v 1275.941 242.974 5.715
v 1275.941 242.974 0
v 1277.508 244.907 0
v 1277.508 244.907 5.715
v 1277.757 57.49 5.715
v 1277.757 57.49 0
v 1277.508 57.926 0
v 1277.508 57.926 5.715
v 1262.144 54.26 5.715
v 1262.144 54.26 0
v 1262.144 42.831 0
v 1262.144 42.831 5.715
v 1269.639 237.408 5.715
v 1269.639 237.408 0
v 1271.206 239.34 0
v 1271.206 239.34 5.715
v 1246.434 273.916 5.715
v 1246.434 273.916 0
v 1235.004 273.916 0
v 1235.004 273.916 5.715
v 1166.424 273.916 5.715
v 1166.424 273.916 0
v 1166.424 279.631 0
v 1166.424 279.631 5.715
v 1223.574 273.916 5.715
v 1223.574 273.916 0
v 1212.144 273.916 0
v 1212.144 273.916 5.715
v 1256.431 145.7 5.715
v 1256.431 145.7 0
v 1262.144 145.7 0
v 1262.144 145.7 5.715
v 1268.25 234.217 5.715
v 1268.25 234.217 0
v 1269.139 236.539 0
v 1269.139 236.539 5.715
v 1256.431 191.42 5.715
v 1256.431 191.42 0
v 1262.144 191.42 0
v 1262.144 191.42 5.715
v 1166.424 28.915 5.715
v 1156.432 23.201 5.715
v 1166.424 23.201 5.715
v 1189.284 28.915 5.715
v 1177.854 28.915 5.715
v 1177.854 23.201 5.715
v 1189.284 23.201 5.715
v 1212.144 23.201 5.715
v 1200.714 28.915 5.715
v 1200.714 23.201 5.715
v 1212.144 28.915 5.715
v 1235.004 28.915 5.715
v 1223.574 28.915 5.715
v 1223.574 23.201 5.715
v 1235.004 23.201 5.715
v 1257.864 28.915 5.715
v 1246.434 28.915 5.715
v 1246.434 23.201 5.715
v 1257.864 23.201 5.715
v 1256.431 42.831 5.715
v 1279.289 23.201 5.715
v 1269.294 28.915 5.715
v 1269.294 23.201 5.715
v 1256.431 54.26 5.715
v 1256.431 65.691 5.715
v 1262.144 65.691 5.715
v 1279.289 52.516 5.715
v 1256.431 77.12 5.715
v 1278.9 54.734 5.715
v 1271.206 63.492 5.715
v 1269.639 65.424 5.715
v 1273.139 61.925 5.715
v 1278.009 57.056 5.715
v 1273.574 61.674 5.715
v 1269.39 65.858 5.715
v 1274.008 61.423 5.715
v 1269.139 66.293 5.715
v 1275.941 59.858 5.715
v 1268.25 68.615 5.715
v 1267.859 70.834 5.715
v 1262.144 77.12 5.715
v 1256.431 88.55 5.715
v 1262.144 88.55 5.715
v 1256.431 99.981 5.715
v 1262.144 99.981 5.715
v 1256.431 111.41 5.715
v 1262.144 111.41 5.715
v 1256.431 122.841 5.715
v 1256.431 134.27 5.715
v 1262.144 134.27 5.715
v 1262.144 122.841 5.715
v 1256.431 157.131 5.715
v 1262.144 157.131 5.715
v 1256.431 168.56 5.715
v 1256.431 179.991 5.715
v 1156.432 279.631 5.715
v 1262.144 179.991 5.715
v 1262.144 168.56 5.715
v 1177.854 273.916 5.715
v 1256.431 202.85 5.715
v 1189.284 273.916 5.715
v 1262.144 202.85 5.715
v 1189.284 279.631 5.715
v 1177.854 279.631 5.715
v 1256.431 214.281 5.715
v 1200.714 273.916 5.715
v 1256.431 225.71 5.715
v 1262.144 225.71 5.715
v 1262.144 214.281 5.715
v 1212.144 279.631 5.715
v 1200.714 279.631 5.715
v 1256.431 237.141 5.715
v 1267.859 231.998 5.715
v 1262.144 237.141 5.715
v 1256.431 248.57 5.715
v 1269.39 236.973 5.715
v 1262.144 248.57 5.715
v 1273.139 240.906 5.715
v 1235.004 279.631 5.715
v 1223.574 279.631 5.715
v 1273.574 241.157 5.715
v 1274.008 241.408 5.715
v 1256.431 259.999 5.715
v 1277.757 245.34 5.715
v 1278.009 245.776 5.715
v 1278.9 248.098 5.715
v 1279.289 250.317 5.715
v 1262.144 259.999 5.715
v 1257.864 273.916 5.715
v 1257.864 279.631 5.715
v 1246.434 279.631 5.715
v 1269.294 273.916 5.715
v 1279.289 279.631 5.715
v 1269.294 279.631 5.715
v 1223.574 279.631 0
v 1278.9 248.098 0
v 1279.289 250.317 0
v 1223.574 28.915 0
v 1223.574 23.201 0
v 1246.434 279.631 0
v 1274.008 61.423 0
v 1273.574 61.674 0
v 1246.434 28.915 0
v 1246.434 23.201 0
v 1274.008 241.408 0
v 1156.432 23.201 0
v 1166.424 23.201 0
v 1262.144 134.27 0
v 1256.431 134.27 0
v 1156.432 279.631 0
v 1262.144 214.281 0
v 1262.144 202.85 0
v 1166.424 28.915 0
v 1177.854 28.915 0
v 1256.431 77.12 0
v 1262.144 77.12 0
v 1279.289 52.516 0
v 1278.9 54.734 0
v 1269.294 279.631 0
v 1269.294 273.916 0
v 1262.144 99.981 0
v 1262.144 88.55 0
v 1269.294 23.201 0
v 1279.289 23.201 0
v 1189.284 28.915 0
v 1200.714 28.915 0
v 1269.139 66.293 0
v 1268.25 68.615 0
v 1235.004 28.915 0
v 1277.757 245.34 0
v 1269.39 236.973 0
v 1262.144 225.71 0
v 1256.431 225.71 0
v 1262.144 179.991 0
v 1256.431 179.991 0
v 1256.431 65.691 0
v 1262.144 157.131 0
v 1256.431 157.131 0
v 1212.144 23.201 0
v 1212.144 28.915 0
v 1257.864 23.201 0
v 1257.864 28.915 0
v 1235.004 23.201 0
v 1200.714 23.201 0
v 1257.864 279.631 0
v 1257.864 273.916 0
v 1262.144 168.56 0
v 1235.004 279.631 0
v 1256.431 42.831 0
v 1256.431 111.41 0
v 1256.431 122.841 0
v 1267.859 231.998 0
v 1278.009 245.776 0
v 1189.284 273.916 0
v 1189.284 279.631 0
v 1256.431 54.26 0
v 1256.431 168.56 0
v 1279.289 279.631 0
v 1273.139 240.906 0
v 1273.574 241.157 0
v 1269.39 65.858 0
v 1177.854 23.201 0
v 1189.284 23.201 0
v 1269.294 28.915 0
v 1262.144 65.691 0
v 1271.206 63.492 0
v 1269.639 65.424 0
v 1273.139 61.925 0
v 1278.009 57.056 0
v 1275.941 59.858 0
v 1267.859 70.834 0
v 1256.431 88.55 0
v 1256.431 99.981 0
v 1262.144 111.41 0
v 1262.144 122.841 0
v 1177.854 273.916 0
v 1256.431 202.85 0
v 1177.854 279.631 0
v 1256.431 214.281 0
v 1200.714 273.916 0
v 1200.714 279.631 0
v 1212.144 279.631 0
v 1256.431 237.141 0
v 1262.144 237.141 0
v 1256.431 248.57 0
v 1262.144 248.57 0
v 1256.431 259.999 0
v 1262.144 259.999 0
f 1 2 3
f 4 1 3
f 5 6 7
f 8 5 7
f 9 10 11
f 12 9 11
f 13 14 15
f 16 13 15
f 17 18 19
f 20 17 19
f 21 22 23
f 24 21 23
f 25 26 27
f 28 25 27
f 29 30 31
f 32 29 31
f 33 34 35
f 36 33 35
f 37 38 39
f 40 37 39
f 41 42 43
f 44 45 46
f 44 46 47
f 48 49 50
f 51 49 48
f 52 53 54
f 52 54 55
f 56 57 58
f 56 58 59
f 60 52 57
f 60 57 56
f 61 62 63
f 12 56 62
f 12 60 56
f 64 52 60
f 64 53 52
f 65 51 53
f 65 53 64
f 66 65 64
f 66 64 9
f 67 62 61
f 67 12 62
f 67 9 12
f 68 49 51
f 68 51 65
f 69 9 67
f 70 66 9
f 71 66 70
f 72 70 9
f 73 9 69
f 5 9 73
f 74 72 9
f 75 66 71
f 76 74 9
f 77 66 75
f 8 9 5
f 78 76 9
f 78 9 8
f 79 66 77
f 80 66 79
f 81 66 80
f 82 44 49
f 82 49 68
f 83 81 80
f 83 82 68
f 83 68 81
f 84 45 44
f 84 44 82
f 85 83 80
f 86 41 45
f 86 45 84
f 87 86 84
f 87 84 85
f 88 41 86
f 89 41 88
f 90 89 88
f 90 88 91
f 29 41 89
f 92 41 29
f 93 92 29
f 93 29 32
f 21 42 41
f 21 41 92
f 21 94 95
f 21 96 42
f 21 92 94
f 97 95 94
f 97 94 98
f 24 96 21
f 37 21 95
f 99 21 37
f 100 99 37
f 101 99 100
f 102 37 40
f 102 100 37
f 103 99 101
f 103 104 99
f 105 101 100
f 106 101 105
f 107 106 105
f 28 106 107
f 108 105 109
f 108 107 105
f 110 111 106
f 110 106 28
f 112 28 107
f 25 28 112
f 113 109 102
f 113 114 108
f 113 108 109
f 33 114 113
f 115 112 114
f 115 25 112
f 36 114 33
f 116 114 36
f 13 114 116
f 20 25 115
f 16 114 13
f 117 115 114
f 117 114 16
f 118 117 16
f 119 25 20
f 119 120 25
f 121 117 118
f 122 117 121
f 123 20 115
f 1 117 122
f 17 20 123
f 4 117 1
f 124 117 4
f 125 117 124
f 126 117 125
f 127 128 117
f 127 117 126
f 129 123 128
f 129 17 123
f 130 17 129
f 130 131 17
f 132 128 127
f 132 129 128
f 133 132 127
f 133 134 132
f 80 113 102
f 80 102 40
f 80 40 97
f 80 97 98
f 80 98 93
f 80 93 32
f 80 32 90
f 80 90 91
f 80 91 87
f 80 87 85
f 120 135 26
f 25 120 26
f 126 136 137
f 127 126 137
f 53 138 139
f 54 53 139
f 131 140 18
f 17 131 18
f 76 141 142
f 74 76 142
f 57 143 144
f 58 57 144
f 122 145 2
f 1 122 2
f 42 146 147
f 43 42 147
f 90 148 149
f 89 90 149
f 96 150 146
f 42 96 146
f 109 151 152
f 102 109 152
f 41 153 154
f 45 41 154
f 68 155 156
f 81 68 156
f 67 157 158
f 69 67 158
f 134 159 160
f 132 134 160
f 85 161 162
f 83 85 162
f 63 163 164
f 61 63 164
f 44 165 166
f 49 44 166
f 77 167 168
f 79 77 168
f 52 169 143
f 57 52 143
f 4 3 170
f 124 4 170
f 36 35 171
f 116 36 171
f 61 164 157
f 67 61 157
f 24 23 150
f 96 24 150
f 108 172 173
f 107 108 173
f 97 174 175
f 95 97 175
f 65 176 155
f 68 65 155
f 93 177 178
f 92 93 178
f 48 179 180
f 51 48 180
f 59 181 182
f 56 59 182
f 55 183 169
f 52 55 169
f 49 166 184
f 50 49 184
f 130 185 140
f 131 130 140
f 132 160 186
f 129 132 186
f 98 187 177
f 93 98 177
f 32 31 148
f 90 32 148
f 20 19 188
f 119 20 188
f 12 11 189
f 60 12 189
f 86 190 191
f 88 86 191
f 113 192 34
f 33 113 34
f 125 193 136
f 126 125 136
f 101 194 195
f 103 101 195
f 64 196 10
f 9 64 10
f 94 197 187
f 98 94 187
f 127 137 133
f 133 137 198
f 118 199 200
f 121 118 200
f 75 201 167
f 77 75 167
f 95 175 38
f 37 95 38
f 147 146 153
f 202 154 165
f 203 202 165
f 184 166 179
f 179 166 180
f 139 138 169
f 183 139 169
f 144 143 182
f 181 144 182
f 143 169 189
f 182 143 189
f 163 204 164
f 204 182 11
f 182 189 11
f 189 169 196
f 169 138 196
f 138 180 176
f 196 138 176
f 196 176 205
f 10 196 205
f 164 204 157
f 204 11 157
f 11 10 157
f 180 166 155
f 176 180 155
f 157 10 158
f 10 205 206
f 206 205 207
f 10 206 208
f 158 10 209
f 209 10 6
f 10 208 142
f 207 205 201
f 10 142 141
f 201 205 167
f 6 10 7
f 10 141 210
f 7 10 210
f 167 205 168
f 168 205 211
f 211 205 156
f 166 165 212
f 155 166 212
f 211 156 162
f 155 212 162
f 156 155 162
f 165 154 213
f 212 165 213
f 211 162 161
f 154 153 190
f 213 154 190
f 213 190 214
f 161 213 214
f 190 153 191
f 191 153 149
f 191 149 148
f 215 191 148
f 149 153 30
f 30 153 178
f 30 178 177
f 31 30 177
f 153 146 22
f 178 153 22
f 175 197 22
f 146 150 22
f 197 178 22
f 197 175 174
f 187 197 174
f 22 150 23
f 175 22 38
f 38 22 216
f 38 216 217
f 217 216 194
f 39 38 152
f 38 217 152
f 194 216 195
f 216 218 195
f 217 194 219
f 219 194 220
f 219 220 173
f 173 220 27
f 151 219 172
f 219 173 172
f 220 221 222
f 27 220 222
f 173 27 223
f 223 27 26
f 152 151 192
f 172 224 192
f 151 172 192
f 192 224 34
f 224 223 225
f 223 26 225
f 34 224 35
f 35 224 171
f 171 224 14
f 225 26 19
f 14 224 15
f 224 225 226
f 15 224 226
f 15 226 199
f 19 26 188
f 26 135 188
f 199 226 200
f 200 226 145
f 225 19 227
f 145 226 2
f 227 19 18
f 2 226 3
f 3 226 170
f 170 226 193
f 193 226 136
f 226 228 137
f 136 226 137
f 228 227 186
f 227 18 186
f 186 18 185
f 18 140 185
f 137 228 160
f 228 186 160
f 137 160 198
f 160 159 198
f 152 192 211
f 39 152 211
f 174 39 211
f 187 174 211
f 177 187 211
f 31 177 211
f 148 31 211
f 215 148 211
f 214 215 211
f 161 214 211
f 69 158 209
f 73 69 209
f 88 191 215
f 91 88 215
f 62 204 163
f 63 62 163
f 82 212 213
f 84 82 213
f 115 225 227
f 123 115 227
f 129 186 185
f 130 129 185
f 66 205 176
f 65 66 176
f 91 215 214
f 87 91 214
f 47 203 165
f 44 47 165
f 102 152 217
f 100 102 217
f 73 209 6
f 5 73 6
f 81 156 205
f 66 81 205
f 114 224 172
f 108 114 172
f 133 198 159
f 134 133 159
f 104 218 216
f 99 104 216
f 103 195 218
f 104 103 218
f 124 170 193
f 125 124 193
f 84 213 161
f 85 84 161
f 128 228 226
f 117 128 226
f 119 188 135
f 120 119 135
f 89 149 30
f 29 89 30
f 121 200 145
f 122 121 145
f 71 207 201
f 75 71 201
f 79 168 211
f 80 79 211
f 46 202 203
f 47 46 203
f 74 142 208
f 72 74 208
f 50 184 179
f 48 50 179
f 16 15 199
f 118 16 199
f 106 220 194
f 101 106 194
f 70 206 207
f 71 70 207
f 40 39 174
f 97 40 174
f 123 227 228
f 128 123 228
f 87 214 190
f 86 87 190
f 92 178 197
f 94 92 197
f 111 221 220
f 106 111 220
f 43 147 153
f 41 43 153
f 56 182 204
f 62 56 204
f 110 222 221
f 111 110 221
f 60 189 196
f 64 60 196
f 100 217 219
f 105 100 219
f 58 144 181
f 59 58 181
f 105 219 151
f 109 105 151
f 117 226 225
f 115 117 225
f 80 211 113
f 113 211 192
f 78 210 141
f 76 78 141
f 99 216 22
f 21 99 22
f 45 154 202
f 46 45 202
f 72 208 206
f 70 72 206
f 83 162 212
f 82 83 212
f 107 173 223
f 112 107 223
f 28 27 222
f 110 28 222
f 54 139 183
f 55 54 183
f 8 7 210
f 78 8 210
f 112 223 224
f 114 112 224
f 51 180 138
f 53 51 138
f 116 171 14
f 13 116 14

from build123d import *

# Parameters (mm, degrees)
BOSS_EXTRUDE1_DEPTH = 5.715


with BuildPart() as part:
    # Model → Boss-Extrude1 (new body)
    with BuildSketch(Plane.XY):
        Polygon((1156.43152, 23.2006394), (1166.42388, 23.2006394), (1166.42388, 28.91536), (1177.85388, 28.91536), (1177.85388, 23.2006394), (1189.28388, 23.2006394), (1189.28388, 28.91536), (1200.71388, 28.91536), (1200.71388, 23.2006394), (1212.14388, 23.2006394), (1212.14388, 28.91536), (1223.57388, 28.91536), (1223.57388, 23.2006394), (1235.00388, 23.2006394), (1235.00388, 28.91536), (1246.43388, 28.91536), (1246.43388, 23.2006394), (1257.86388, 23.2006394), (1257.86388, 28.91536), (1269.29388, 28.91536), (1269.29388, 23.2006394), (1279.28878, 23.2006394), (1279.28878, 51.775868), (1279.28878, 52.515516), (1278.90016, 54.734206), (1278.00862, 57.056274), (1277.75716, 57.49036), (1277.50824, 57.925716), (1275.94106, 59.857894), (1274.00812, 61.423296), (1273.57378, 61.673994), (1273.13944, 61.924946), (1271.2065, 63.491872), (1269.63932, 65.423796), (1269.3904, 65.857882), (1269.13894, 66.293238), (1268.24994, 68.615306), (1267.85878, 70.833996), (1267.85878, 71.572628), (1267.85878, 231.25811), (1267.85878, 231.998266), (1268.24994, 234.216956), (1269.13894, 236.539024), (1269.3904, 236.972856), (1269.63932, 237.408466), (1271.2065, 239.34039), (1273.13944, 240.906046), (1273.57378, 241.156744), (1274.00812, 241.407696), (1275.94106, 242.974368), (1277.50824, 244.906546), (1277.75716, 245.340378), (1278.00862, 245.775988), (1278.90016, 248.098056), (1279.28878, 250.316746), (1279.28878, 251.055124), (1279.28878, 279.63114), (1269.29388, 279.63114), (1269.29388, 273.91614), (1257.86388, 273.91614), (1257.86388, 279.63114), (1246.43388, 279.63114), (1246.43388, 273.91614), (1235.00388, 273.91614), (1235.00388, 279.63114), (1223.57388, 279.63114), (1223.57388, 273.91614), (1212.14388, 273.91614), (1212.14388, 279.63114), (1200.71388, 279.63114), (1200.71388, 273.91614), (1189.28388, 273.91614), (1189.28388, 279.63114), (1177.85388, 279.63114), (1177.85388, 273.91614), (1166.42388, 273.91614), (1166.42388, 279.63114), (1156.43152, 279.63114), align=None)
        Polygon((1262.14378, 48.545496), (1262.14378, 42.83075), (1256.43132, 42.83075), (1256.43132, 54.260496), (1262.14378, 54.260496), align=None, mode=Mode.SUBTRACT)
        Polygon((1262.14378, 71.40575), (1262.14378, 65.691004), (1256.43132, 65.691004), (1256.43132, 77.120496), (1262.14378, 77.120496), align=None, mode=Mode.SUBTRACT)
        Polygon((1262.14378, 94.266004), (1262.14378, 88.549988), (1256.43132, 88.549988), (1256.43132, 99.98075), (1262.14378, 99.98075), align=None, mode=Mode.SUBTRACT)
        Polygon((1262.14378, 117.124988), (1262.14378, 111.410496), (1256.43132, 111.410496), (1256.43132, 122.841004), (1262.14378, 122.841004), align=None, mode=Mode.SUBTRACT)
        Polygon((1262.14378, 139.985496), (1262.14378, 134.270496), (1256.43132, 134.270496), (1256.43132, 145.699988), (1262.14378, 145.699988), align=None, mode=Mode.SUBTRACT)
        Polygon((1262.14378, 162.845496), (1262.14378, 157.13075), (1256.43132, 157.13075), (1256.43132, 168.560496), (1262.14378, 168.560496), align=None, mode=Mode.SUBTRACT)
        Polygon((1262.14378, 185.70575), (1262.14378, 179.991004), (1256.43132, 179.991004), (1256.43132, 191.420496), (1262.14378, 191.420496), align=None, mode=Mode.SUBTRACT)
        Polygon((1262.14378, 208.566004), (1262.14378, 202.849988), (1256.43132, 202.849988), (1256.43132, 214.28075), (1262.14378, 214.28075), align=None, mode=Mode.SUBTRACT)
        Polygon((1262.14378, 231.424988), (1262.14378, 225.710496), (1256.43132, 225.710496), (1256.43132, 237.141004), (1262.14378, 237.141004), align=None, mode=Mode.SUBTRACT)
        Polygon((1262.14378, 254.28448), (1262.14378, 248.570496), (1256.43132, 248.570496), (1256.43132, 259.99948), (1262.14378, 259.99948), align=None, mode=Mode.SUBTRACT)
    extrude(amount=BOSS_EXTRUDE1_DEPTH)


solid = part.part
